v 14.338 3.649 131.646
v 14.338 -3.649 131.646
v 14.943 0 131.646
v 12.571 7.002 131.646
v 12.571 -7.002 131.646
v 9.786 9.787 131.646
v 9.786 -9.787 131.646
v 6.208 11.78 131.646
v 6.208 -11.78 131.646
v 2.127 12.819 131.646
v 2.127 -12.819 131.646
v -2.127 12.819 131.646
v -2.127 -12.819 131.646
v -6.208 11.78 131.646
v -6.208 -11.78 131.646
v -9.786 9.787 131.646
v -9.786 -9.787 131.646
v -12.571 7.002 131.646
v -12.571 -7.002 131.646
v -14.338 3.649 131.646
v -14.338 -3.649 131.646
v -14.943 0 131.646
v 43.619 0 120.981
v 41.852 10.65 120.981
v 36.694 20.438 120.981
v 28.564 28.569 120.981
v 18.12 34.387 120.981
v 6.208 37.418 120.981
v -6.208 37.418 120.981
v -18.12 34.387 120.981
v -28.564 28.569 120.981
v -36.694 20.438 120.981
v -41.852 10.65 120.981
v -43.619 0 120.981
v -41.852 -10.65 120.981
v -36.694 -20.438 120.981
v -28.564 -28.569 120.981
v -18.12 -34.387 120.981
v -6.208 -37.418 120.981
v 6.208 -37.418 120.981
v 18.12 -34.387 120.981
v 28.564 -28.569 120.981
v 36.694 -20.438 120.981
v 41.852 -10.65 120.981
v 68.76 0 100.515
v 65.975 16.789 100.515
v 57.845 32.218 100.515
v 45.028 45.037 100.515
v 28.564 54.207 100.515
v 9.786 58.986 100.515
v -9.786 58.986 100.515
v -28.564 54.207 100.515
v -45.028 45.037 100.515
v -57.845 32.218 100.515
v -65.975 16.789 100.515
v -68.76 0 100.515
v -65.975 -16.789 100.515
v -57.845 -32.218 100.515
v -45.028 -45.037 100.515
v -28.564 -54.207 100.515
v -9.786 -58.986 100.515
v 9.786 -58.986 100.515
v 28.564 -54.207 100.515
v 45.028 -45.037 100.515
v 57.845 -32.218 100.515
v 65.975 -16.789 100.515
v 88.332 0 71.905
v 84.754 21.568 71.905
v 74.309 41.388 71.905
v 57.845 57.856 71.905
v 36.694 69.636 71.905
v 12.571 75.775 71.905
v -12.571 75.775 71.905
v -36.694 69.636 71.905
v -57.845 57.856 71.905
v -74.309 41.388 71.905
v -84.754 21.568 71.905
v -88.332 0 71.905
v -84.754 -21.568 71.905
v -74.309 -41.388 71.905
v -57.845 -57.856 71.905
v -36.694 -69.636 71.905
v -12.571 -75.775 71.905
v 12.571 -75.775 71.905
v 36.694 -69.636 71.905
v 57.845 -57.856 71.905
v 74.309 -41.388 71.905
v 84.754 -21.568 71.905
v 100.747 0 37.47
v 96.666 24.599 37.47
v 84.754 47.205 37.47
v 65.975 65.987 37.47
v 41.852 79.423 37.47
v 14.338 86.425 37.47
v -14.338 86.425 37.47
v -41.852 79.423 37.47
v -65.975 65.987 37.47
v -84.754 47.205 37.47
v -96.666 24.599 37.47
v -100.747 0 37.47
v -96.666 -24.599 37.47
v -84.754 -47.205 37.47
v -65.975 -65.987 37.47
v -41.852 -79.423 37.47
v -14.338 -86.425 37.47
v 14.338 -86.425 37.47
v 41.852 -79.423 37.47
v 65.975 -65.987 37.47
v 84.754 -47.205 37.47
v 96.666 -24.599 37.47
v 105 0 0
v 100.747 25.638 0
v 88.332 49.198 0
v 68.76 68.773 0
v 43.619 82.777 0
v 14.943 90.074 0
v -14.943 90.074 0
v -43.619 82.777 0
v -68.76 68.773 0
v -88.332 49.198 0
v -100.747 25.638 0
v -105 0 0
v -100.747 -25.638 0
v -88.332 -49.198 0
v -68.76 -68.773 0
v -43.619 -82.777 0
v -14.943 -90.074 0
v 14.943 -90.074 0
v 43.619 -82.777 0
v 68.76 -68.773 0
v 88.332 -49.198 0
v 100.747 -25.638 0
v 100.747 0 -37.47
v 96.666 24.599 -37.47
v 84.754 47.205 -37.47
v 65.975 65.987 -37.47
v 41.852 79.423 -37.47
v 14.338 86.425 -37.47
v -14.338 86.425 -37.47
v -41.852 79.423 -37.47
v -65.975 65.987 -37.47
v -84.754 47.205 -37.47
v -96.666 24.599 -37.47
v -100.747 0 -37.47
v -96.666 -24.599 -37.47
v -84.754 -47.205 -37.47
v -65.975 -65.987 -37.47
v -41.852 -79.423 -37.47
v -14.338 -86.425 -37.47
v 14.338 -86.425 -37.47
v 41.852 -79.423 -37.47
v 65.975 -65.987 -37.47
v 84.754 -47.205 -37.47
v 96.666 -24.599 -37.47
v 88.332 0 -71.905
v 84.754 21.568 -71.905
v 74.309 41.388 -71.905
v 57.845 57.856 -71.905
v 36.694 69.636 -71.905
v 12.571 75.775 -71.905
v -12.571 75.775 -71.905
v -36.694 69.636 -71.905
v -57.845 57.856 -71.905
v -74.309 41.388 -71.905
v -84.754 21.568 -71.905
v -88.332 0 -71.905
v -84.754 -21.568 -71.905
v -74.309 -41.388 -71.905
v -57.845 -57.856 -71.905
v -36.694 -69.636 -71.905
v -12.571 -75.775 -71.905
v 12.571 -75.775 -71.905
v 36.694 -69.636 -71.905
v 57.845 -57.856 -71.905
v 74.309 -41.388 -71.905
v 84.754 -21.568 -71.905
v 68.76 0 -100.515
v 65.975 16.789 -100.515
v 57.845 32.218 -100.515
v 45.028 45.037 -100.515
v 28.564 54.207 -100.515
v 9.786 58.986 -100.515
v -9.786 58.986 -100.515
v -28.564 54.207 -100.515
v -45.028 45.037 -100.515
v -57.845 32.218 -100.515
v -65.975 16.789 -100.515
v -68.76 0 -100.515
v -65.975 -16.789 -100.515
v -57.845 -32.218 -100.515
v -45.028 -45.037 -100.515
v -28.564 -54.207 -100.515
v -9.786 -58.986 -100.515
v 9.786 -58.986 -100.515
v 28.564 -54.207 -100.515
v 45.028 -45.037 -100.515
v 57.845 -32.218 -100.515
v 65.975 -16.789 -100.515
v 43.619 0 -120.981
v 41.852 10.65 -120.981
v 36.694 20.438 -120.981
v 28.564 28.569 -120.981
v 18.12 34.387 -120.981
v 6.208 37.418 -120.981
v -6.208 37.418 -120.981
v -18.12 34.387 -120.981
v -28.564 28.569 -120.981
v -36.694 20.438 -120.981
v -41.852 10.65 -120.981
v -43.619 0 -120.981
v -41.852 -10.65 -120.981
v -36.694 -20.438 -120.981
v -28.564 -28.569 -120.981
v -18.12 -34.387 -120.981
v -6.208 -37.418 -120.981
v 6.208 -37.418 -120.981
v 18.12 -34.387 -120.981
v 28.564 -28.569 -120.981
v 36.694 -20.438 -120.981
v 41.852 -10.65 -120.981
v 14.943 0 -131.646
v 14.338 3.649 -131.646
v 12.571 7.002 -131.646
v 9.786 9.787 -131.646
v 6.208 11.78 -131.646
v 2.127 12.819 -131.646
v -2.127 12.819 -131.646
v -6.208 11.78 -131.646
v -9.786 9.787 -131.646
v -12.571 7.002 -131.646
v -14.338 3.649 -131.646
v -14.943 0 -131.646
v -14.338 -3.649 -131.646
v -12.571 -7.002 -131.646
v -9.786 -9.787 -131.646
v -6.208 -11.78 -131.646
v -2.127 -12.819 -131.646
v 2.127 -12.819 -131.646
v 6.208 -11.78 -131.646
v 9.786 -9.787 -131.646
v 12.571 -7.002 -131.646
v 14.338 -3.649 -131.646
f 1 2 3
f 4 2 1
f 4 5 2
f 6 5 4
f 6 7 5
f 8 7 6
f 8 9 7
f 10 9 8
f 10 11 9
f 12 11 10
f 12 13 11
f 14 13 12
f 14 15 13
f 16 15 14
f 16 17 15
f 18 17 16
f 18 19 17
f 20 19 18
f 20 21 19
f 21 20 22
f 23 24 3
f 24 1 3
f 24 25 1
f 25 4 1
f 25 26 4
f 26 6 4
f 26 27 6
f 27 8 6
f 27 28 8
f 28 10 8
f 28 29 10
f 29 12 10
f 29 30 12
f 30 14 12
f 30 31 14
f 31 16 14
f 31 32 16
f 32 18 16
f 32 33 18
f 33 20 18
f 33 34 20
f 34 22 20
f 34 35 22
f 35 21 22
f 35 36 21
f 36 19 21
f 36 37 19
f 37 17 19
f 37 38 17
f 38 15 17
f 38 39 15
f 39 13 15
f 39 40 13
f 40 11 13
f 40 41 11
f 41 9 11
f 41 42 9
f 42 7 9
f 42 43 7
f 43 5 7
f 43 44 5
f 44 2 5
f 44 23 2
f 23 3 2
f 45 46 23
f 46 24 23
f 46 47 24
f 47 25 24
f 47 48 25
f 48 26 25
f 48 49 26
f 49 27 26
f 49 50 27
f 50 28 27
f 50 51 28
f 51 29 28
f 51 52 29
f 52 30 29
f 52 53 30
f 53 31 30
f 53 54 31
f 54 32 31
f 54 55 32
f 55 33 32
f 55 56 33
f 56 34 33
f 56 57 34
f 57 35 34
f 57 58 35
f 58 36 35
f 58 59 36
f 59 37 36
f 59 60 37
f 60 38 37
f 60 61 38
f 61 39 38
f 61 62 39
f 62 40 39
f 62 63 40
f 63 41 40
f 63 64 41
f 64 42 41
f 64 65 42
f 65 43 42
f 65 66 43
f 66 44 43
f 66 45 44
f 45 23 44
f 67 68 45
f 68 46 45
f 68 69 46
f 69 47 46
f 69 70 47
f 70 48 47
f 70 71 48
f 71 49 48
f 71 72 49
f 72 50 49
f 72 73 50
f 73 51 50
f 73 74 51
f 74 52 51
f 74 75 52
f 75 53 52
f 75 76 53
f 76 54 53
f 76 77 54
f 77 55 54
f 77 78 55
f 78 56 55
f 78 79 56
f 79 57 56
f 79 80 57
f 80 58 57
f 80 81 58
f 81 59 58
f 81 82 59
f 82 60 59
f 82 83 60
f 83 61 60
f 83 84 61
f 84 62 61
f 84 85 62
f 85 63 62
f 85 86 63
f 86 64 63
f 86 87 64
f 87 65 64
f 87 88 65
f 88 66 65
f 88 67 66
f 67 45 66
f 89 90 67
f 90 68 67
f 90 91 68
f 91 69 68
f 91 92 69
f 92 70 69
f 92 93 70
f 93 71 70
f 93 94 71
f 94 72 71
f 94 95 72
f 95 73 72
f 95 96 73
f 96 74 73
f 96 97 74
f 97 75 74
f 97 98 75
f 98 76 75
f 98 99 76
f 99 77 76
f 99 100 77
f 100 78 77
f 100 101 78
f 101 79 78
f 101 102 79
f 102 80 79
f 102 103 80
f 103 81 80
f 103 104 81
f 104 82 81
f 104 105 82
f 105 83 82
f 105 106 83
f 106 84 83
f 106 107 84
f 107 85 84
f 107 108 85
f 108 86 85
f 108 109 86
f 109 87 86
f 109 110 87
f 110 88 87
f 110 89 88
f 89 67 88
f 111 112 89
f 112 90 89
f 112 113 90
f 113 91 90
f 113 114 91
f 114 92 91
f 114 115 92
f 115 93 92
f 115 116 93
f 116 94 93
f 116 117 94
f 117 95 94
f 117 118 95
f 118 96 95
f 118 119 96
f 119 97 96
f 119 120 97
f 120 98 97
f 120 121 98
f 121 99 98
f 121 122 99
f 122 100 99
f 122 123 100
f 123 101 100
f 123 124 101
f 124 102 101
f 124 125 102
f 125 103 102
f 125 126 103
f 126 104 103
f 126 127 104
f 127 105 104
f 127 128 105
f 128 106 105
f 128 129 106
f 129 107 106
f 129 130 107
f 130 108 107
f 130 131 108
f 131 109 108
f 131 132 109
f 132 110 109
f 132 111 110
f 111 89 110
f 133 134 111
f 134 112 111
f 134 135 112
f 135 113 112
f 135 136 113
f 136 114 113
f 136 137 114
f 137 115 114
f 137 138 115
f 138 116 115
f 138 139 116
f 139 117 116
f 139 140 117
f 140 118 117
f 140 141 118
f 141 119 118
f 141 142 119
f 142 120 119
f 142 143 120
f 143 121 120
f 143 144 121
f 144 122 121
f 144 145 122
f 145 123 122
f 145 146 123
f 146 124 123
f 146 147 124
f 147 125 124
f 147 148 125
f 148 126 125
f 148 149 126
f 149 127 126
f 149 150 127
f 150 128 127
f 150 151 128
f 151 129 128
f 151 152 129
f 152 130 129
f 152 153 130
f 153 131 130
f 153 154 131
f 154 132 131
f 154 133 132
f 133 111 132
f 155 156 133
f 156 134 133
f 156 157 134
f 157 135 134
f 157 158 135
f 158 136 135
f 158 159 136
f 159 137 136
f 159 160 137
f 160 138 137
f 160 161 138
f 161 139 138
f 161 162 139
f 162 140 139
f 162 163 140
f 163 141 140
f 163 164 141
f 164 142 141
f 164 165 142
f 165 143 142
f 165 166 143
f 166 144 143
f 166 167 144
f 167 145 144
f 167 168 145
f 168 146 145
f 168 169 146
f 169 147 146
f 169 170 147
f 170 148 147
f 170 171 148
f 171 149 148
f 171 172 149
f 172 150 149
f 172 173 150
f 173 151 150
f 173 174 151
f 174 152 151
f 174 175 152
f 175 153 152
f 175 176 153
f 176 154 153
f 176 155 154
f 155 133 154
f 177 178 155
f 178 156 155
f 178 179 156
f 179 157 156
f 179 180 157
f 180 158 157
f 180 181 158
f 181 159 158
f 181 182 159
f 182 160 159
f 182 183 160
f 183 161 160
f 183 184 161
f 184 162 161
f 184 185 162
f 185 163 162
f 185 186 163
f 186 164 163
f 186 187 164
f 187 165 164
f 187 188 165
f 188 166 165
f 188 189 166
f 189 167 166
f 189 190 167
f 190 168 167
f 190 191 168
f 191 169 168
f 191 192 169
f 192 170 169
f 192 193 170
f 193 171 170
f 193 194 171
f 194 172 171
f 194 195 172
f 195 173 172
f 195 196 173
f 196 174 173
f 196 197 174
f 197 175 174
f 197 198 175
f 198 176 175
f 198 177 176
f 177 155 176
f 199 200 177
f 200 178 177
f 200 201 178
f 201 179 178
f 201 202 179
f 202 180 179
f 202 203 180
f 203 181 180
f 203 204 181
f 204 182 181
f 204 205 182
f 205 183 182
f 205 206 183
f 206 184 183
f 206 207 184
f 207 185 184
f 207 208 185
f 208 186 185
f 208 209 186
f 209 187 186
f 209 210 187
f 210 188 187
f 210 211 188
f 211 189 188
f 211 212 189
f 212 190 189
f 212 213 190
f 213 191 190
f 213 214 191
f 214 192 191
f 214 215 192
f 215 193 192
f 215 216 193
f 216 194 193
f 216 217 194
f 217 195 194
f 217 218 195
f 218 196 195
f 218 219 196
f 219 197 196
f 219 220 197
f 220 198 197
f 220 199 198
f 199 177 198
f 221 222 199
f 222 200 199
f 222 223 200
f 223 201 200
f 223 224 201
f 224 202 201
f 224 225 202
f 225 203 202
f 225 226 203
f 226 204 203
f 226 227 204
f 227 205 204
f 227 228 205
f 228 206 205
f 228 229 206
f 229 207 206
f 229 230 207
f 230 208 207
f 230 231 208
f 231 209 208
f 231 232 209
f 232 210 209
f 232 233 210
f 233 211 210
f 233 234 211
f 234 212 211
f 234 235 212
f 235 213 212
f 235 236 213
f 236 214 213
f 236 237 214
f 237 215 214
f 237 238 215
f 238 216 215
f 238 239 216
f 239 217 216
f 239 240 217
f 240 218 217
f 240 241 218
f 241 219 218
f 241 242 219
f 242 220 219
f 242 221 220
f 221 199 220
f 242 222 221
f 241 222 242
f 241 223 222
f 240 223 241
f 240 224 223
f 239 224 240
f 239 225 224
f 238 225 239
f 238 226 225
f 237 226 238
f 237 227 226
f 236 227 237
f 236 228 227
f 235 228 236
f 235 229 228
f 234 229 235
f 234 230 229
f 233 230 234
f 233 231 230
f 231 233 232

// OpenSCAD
// Generated by SolidPython 1.0.1 on 2020-07-29 00:46:52


scale(v = [15, 13, 19]) {
	sphere(r = 7);
}
/***********************************************
*********      SolidPython code:      **********
************************************************
 
# import packages: SolidPython
from solid import *
from solid.utils import *
from itertools import chain, combinations, permutations


class Resize:

    def __init__(self, scad_file):
        self.scad_file = scad_file
        #self.scad_file = import_scad(scad_file)
        # cone/cylinder param:
        self.r1 = 0
        self.r2 = 0
        self.h = 0
        # rectangular prism param:
        self.w = 0
        self.l = 0
        # ellipse param:
        self.r = 0

    # import OpenScad code (file name corresponds to shape)


    # classify shape + parameters
    def assign(self, param1, param2, param3):
        if self.scad_file == 'cone.scad':
            self.r1 = param1
            self.r2 = param2
            self.h = param3
        elif self.scad_file == 'cylinder.scad':
            self.r1 = param1
            self.r2 = param2
            self.h = param3
        elif self.scad_file == 'rectangularPrism.scad':
            self.h = param1
            self.l = param2
            self.w = param3
        else:
            self.r = param1
            self.h = param2

    # resize parameters
    def iterate(self):
        x = range(3, 20, 2)
        i = 1
        if self.scad_file == 'cone.scad':
            tempList = list(permutations(x, 2))
            for temp in tempList:
                param1 = temp[0]
                param2 = temp[1]
                filepath = 'produced_scad_files/' + 'cone' + str(param1) + '_' + str(param2) + '_' + '.scad'
                scad_render_to_file(cylinder(h=param1, r1=param2, r2=0), filepath)

        elif self.scad_file == 'cylinder.scad':
            tempList = list(permutations(x, 3))
            for temp in tempList:
                param1 = temp[0]
                param2 = temp[1]
                filepath = 'produced_scad_files/' + 'cylinder' + str(param1) + '_' + str(param2) + '_' + '.scad'
                scad_render_to_file(cylinder(h=param1, r1=param2, r2=param2), filepath)

        elif self.scad_file == 'rectangularPrism.scad':
            tempList = list(permutations(x, 3))
            for temp in tempList:
                param1 = temp[0]
                param2 = temp[1]
                param3 = temp[2]
                filepath = 'produced_scad_files/' + 'rectangularPrism' + str(param1) + '_' + str(param2) + '_' + str(
                    param3) + '.scad'
                scad_render_to_file(cube(size=(param1, param2, param3)), filepath)

        elif self.scad_file == 'ellipse.scad':
            tempList = list(permutations(x, 4))
            for temp in tempList:
                param1 = temp[0]
                param2 = temp[1]
                param3 = temp[2]
                param4 = temp[3]
                filepath = 'produced_scad_files/' + 'ellipse' + str(param1) + '_' + str(param2) + '_' + str(param3) + '_' + str(param4) + '.scad'
                scad_render_to_file(scale([param1, param2, param3])(sphere(r=param4)), filepath)

    def render_to_scadfile(self):
        scad_render_to_file(scad, 'example.scad') 
 
************************************************/
